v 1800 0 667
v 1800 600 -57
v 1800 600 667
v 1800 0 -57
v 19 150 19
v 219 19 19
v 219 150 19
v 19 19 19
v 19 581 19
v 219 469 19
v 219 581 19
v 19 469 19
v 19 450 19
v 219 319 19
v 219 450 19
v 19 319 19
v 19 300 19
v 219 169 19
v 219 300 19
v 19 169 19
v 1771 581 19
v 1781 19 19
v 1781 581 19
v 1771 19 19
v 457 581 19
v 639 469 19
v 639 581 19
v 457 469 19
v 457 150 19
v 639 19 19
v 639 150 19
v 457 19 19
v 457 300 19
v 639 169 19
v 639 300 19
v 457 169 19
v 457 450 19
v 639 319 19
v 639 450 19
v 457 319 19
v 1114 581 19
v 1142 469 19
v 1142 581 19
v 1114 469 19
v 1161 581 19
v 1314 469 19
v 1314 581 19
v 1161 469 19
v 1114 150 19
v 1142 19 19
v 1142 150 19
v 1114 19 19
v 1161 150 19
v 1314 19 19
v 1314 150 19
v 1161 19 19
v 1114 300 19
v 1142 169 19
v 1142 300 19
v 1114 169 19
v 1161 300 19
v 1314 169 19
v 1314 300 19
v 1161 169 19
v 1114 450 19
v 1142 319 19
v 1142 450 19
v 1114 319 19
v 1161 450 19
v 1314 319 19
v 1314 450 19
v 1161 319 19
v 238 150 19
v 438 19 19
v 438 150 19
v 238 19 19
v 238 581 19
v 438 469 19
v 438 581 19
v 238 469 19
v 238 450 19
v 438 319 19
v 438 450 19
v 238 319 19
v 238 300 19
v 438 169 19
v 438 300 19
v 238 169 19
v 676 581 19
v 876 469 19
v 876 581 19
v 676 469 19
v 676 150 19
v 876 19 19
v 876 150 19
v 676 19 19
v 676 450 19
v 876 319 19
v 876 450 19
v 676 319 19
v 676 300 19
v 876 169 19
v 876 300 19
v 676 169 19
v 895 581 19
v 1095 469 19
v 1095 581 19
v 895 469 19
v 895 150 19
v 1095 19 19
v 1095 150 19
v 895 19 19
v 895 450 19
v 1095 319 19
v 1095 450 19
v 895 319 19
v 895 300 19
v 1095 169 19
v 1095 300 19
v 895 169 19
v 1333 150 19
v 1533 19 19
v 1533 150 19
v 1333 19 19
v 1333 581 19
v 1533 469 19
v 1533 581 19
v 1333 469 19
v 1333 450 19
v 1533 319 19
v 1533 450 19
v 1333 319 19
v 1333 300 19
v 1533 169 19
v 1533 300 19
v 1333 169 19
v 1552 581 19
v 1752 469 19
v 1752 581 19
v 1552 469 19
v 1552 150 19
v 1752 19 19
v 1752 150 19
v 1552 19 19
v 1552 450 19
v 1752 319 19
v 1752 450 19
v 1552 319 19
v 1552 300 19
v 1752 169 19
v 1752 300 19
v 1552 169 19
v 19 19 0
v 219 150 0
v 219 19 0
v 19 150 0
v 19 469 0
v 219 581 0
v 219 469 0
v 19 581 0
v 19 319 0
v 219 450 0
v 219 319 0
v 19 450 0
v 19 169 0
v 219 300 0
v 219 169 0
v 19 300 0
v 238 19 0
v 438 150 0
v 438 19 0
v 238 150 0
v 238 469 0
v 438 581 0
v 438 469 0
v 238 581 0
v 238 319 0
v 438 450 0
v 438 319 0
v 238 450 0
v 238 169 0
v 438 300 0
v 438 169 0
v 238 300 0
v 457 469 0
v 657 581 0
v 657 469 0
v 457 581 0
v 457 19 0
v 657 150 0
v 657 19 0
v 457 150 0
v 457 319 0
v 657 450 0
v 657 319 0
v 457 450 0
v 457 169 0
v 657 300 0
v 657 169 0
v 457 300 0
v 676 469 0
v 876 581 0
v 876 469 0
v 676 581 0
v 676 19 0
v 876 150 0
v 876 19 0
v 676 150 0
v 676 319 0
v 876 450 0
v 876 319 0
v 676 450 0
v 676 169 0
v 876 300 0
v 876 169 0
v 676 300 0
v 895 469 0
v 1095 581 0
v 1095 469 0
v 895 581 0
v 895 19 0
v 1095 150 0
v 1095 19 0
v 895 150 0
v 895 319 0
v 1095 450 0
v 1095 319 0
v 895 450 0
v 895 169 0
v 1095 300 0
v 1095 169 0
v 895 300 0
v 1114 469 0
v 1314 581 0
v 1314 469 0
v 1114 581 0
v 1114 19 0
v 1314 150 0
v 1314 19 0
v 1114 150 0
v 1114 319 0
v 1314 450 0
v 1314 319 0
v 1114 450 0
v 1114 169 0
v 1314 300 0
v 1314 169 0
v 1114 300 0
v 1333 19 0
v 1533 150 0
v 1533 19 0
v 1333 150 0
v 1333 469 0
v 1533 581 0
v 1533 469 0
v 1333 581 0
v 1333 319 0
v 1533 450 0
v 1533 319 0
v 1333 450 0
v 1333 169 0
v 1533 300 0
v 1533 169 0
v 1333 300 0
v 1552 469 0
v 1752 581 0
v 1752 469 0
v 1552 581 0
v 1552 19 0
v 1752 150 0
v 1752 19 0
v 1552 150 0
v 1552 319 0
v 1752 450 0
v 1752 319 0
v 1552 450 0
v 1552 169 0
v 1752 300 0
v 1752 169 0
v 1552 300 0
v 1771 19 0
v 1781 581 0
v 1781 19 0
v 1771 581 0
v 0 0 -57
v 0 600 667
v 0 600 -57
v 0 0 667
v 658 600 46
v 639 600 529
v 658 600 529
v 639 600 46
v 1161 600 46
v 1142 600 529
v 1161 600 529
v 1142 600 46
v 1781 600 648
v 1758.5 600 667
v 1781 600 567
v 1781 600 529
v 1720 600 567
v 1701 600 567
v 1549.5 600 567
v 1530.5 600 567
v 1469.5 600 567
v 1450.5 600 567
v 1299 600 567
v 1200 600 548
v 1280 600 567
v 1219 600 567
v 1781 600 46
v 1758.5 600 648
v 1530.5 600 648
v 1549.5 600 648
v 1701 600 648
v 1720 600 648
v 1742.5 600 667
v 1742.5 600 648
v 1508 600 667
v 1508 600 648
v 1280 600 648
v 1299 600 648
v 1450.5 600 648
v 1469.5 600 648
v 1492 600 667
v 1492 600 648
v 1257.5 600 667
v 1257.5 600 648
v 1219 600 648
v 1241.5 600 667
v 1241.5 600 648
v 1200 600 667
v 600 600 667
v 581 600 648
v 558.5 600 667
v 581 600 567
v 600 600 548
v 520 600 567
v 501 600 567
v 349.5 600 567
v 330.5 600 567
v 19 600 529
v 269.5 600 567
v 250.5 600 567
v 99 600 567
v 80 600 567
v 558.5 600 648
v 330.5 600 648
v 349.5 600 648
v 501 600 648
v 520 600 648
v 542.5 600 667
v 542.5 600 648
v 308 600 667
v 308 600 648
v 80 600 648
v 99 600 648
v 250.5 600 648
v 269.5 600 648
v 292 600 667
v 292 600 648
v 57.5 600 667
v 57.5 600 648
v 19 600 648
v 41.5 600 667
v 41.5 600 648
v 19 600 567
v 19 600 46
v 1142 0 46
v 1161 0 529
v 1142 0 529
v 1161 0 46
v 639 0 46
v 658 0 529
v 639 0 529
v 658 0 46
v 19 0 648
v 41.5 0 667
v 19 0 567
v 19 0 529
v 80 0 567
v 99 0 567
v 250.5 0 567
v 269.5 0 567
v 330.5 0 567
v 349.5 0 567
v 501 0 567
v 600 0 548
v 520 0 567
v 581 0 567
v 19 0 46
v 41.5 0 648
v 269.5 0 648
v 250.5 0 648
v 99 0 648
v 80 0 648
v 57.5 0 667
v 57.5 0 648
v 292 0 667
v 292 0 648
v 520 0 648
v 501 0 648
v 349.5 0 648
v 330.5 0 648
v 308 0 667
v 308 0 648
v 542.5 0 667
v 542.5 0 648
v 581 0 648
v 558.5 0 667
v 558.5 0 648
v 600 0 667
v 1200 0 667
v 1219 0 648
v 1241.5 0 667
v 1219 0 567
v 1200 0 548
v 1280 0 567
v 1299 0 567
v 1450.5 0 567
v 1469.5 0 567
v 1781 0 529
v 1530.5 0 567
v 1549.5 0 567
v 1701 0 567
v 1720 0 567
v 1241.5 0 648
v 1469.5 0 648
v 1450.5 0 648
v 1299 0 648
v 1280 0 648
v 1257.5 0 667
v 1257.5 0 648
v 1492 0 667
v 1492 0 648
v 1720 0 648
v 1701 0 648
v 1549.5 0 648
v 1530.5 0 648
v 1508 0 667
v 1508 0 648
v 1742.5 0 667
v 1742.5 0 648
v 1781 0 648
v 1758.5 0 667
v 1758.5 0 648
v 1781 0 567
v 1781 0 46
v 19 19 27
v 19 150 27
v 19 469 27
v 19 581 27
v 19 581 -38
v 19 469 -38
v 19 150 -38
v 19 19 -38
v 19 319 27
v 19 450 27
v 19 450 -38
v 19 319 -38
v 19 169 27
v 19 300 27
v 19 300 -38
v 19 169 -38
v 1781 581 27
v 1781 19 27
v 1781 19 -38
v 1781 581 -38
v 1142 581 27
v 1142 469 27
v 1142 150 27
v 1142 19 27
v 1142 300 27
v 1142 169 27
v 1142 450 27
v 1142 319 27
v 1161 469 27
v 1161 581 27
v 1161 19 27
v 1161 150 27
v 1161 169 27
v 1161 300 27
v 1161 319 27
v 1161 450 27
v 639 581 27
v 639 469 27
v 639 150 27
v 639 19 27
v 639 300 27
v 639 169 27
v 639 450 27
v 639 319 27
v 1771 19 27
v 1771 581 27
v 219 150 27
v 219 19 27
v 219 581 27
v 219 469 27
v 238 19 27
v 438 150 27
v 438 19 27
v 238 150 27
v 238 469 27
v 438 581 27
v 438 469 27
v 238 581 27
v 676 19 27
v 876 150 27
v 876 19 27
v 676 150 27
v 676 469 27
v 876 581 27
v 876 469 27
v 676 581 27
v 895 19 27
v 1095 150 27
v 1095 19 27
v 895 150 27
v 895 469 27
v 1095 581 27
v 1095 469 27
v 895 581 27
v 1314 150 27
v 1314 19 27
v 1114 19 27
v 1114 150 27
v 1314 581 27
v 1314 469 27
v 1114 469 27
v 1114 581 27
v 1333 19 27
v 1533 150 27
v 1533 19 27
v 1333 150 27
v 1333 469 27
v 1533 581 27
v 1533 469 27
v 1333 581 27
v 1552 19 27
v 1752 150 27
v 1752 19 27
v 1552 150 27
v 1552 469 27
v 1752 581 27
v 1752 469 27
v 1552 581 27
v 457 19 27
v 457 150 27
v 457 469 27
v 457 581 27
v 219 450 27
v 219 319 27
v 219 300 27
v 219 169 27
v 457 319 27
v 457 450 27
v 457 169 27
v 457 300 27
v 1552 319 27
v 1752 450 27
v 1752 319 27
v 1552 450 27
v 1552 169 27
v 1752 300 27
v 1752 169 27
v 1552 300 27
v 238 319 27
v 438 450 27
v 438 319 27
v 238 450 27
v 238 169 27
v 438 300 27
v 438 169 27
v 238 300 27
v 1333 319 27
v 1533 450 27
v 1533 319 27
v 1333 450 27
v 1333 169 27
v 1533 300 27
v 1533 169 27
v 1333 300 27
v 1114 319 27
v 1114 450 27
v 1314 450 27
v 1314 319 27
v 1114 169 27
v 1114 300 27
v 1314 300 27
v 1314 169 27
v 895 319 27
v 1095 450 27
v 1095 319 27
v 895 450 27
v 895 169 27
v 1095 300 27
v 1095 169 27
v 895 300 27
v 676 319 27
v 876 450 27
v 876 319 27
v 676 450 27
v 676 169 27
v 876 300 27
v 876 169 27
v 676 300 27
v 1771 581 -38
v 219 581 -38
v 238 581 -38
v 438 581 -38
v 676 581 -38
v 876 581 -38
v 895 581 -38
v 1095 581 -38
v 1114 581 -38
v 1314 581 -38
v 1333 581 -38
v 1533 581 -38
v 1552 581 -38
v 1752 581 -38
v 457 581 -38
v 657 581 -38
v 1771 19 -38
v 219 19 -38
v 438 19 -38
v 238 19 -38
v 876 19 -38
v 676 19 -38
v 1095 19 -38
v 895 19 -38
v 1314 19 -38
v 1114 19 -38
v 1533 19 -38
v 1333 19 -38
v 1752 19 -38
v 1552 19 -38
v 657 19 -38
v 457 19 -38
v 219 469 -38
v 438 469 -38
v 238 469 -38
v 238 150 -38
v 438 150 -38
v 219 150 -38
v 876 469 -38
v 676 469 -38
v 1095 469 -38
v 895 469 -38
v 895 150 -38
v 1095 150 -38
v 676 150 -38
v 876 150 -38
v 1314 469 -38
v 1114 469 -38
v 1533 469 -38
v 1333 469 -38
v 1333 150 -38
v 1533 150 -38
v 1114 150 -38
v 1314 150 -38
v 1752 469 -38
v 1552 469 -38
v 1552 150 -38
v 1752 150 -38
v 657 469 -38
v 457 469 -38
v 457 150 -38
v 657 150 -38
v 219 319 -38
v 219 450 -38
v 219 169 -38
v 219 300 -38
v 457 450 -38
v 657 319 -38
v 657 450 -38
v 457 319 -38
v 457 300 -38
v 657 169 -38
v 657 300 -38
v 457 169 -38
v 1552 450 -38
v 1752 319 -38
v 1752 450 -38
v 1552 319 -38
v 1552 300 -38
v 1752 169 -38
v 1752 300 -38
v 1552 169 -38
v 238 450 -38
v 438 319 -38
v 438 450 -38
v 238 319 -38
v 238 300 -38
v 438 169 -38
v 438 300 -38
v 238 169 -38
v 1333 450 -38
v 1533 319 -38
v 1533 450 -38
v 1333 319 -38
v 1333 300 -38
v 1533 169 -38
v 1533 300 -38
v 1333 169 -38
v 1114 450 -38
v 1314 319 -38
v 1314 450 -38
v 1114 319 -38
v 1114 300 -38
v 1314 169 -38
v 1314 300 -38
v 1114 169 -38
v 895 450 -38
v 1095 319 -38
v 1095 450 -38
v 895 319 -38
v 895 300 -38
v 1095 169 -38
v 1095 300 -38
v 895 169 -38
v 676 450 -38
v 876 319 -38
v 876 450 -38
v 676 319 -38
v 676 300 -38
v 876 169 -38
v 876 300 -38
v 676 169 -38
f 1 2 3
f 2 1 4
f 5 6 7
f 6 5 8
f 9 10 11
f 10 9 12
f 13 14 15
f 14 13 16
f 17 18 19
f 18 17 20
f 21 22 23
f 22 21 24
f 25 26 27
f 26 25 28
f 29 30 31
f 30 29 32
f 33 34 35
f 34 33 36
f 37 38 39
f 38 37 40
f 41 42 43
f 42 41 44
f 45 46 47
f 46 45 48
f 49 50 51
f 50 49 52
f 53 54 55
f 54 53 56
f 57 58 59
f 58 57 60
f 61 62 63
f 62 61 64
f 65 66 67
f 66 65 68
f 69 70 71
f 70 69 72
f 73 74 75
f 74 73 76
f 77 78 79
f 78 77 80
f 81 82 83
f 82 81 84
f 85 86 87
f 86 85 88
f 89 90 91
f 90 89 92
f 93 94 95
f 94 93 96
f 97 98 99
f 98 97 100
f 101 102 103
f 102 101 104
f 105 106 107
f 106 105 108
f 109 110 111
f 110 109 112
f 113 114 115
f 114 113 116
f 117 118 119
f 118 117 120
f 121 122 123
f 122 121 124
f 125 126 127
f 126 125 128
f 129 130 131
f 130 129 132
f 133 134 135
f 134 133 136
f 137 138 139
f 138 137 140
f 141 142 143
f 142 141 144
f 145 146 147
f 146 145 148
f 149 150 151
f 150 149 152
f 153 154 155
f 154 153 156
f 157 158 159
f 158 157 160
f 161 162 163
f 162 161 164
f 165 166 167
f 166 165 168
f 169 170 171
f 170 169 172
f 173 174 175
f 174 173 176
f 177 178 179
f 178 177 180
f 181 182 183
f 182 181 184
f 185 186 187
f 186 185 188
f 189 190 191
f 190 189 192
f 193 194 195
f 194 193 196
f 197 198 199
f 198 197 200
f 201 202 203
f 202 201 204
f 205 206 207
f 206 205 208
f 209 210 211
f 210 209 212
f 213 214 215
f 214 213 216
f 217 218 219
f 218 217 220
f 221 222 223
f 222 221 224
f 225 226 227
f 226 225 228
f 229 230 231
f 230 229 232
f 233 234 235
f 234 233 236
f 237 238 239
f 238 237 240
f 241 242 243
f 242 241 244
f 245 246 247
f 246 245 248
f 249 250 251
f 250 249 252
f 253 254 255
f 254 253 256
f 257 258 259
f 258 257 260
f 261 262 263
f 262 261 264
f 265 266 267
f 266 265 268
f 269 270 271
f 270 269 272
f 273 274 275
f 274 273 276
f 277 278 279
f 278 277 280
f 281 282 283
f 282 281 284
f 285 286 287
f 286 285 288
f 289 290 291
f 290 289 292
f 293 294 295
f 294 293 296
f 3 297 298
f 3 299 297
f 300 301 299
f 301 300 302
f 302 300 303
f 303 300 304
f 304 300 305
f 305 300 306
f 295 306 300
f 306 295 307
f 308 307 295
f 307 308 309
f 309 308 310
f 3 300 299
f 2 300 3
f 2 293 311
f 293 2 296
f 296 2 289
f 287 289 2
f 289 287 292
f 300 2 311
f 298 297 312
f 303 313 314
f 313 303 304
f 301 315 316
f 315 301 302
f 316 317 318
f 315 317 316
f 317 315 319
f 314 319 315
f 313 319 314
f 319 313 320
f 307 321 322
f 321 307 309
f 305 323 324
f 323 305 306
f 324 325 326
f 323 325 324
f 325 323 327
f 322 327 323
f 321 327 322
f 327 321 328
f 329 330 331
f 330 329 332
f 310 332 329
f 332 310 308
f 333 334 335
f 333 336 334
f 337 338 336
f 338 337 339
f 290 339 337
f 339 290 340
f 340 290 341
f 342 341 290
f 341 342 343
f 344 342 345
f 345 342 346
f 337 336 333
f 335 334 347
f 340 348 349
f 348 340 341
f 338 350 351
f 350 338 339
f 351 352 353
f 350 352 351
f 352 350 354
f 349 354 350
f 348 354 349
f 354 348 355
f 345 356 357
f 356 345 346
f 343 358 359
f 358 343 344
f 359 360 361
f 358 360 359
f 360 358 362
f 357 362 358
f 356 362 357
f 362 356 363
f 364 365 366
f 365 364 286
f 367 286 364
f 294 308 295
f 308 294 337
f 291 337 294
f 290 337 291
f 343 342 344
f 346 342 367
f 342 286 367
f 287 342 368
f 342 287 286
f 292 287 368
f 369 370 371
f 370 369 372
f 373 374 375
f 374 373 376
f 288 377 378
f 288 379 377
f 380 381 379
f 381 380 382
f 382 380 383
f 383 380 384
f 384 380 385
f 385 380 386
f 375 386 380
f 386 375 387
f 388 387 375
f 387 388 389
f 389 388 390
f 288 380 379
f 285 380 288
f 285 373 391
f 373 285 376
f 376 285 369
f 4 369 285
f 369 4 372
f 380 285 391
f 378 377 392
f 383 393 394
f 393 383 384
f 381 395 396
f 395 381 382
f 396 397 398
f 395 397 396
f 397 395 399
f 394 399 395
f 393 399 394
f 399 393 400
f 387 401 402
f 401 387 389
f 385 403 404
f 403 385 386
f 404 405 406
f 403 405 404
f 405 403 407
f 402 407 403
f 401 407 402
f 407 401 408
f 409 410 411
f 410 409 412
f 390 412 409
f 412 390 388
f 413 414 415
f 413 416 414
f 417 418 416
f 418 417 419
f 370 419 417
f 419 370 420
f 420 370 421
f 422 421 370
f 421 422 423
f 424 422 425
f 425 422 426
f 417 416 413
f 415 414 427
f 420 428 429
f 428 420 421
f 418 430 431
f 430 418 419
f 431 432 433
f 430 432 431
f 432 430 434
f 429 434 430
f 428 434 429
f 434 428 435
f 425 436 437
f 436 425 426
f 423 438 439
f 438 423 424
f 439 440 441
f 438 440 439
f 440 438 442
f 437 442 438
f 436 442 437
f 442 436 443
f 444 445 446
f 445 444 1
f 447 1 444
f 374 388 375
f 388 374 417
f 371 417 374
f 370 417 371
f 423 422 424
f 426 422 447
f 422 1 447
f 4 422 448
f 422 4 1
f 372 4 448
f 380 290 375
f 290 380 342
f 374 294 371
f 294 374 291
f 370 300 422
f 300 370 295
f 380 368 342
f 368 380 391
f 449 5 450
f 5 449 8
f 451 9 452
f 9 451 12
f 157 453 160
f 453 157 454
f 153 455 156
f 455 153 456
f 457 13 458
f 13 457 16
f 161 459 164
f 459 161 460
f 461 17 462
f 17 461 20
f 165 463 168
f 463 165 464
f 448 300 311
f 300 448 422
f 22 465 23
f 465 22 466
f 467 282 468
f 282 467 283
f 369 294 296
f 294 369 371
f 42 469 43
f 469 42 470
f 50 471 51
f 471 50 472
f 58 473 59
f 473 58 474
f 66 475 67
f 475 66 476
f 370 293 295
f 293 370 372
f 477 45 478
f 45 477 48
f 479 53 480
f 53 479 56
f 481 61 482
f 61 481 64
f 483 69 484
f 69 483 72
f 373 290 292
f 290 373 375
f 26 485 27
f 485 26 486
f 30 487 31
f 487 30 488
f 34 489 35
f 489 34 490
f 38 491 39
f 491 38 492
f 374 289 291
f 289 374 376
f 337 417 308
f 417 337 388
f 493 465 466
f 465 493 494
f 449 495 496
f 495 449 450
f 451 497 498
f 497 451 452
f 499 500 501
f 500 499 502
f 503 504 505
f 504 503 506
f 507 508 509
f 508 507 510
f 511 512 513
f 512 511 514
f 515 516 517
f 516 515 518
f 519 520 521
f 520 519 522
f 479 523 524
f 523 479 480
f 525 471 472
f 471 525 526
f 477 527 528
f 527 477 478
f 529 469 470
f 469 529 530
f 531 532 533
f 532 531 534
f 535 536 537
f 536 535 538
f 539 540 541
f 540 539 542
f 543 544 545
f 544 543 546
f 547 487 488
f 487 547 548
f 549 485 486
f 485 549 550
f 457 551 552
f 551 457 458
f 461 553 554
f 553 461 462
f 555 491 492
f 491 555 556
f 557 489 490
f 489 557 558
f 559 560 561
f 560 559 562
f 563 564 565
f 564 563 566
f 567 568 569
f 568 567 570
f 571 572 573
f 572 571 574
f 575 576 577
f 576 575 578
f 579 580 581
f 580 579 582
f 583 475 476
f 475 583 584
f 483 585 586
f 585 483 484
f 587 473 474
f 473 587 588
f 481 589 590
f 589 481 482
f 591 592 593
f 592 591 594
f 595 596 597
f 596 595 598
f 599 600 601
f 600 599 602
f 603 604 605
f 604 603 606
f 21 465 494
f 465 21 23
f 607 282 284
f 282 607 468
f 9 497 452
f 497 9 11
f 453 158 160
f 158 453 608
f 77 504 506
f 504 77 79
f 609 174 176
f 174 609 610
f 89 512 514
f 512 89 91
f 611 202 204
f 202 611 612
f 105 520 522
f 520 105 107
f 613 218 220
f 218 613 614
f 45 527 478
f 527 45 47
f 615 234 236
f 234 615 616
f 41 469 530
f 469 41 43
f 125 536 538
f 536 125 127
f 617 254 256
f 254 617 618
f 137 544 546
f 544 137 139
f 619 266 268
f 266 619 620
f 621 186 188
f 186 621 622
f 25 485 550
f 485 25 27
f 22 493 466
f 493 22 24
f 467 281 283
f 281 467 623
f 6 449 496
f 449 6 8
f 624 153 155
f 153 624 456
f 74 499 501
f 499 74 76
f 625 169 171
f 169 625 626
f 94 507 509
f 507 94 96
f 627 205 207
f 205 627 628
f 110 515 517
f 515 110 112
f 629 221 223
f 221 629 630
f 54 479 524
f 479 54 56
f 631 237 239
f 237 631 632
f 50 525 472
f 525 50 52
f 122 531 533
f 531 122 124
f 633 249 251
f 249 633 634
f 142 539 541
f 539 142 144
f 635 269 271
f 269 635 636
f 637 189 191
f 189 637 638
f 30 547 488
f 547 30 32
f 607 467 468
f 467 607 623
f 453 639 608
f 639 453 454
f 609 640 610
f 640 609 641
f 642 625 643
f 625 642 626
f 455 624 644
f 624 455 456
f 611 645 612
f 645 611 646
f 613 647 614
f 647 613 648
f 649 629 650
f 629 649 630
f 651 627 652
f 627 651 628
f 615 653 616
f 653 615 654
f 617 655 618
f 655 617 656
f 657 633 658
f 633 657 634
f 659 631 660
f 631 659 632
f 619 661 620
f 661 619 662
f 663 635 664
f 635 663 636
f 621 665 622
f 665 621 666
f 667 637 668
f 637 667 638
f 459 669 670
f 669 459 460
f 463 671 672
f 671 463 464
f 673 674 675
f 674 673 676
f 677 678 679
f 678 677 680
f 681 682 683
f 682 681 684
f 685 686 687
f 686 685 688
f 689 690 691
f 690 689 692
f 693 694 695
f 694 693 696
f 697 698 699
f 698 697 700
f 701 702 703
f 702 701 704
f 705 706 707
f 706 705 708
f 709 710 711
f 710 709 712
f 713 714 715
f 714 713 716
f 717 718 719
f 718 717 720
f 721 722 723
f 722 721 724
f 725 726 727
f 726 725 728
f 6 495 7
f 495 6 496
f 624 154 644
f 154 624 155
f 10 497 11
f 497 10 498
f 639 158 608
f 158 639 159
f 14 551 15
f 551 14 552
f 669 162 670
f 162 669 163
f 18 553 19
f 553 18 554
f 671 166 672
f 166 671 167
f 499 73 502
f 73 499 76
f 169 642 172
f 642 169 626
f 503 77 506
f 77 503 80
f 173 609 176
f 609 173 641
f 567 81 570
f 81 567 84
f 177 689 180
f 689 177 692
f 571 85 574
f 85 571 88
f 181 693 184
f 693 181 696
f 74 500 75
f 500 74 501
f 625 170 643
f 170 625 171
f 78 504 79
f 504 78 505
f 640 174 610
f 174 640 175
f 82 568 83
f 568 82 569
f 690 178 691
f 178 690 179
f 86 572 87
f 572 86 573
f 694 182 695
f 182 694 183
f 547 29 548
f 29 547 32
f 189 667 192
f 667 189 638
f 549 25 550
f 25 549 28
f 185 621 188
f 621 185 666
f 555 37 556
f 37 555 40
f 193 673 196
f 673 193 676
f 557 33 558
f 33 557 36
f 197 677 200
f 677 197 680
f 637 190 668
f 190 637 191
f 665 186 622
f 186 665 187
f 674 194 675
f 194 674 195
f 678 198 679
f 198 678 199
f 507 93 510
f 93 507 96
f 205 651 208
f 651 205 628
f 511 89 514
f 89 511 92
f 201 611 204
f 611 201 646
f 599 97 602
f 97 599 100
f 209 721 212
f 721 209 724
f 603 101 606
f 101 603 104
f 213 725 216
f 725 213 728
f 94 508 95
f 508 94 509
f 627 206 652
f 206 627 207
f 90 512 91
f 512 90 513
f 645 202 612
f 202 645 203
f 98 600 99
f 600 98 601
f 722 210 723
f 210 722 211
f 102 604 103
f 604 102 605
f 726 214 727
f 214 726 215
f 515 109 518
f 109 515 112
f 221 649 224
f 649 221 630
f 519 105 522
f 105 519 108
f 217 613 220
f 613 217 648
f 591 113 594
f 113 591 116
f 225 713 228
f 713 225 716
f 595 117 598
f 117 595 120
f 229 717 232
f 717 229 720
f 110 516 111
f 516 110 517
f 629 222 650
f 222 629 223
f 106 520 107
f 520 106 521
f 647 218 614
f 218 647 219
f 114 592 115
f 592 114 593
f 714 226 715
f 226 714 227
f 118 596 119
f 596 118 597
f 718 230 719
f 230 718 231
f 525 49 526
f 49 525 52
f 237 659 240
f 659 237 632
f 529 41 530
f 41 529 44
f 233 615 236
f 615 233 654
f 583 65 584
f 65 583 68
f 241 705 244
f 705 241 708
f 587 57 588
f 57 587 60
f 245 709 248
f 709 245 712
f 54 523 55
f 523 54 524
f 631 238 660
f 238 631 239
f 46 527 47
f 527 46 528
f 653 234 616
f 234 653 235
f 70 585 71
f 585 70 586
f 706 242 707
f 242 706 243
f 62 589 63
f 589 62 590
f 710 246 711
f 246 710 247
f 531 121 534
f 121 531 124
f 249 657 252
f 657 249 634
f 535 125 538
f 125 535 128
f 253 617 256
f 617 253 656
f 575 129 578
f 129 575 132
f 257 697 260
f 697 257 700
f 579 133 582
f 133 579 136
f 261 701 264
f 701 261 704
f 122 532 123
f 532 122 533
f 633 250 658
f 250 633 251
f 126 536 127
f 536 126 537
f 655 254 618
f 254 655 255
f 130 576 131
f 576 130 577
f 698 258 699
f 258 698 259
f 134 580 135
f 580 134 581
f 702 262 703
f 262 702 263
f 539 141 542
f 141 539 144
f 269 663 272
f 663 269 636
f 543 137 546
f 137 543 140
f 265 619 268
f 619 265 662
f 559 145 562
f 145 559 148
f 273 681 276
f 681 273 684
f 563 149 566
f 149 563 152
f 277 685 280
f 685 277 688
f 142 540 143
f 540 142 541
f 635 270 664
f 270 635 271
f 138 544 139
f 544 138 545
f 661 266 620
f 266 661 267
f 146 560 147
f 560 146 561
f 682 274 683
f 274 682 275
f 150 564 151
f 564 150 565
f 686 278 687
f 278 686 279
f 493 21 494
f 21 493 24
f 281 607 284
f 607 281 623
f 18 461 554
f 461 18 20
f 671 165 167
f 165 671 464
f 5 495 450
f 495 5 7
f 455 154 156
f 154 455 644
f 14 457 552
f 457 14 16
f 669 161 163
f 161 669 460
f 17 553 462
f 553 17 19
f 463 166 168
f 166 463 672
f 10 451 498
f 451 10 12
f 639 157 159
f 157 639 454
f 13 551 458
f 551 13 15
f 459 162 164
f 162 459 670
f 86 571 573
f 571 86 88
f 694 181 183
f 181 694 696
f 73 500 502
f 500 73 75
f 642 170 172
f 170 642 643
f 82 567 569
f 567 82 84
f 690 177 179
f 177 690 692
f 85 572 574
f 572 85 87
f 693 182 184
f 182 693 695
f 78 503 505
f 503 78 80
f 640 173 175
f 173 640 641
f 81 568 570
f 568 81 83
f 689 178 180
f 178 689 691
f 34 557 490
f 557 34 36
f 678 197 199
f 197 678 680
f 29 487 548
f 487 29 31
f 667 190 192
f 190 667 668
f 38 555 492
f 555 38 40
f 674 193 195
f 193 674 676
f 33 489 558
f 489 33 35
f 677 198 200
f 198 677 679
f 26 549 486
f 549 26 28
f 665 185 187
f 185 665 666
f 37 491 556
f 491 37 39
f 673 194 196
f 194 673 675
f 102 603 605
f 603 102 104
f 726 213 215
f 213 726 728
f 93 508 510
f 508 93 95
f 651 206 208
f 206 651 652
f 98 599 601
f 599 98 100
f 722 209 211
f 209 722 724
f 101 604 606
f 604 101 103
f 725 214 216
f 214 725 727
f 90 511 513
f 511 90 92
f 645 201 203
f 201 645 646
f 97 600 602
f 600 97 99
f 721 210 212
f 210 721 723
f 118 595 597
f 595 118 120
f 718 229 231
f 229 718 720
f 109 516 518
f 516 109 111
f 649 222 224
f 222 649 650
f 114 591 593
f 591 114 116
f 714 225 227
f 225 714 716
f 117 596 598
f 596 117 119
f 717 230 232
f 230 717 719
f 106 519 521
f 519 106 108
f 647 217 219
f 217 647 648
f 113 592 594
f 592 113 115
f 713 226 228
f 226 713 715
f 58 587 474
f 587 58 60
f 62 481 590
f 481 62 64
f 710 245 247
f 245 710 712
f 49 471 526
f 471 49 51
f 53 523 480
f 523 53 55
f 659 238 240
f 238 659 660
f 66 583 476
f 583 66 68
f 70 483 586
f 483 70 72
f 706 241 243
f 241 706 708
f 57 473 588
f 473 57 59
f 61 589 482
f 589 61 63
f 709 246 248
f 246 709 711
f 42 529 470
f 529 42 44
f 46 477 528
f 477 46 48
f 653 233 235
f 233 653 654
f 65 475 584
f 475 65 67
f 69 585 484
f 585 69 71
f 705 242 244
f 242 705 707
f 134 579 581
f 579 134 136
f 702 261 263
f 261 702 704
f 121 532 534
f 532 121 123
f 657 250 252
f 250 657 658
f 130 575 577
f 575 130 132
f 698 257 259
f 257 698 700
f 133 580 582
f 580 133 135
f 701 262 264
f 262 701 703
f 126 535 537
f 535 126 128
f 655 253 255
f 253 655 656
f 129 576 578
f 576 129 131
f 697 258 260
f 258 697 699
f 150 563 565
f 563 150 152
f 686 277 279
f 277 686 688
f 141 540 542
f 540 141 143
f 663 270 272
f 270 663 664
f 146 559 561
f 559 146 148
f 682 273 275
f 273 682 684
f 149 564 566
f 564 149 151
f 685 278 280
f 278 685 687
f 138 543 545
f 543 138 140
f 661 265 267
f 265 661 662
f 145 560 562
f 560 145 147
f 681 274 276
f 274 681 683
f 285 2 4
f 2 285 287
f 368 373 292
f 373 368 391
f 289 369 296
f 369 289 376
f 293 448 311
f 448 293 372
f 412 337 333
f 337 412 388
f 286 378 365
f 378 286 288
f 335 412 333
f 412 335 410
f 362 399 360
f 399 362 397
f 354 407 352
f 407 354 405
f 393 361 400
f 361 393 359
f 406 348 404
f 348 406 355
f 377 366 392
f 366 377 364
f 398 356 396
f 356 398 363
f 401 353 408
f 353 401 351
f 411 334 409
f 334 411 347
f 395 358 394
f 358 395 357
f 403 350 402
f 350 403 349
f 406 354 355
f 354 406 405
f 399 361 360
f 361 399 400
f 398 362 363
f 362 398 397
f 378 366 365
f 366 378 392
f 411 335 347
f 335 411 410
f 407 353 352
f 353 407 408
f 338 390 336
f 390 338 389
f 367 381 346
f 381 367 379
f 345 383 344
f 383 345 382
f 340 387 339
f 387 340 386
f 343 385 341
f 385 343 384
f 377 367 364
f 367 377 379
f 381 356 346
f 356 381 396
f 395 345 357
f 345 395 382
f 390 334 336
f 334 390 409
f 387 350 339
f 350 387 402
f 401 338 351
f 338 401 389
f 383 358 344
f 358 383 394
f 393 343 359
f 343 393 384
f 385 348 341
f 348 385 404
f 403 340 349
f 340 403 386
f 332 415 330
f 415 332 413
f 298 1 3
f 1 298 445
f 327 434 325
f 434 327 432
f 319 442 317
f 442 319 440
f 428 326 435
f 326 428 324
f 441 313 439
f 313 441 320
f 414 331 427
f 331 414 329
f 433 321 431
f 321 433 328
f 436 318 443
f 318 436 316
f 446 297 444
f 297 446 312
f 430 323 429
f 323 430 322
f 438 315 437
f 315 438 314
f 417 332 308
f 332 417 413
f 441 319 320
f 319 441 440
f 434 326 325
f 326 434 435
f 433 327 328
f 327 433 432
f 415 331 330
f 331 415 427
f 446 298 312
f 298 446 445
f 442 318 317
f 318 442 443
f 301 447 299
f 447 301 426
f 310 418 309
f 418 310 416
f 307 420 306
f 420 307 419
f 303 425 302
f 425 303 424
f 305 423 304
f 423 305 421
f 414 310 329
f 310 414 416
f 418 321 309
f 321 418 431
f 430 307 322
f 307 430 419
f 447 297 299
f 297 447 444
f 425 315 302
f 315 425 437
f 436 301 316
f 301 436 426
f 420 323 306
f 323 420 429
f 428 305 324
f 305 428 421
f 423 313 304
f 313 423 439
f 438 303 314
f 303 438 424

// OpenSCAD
dim_major_width = 1800;
dim_major_depth = 600;
dim_carcas_height = 510;

dim_sheet_thickness = 19;

dim_torsion_height = 65;

dim_mitre_height = 100 - dim_sheet_thickness;

//////////////////////////////////////////////////////////////////////////////////////

module sheet(w, h, part){
	cube([w, h, dim_sheet_thickness]);
	echo("BOM:",part,w,h,dim_sheet_thickness);
}

module sheetv(w, h, part){
	translate([0,0,dim_sheet_thickness])cube([w, dim_sheet_thickness, h]);
	echo("BOM:",part,w,h,dim_sheet_thickness);
}

//////////////////////////////////////////////////////////////////////////////////////

carcas();
translate([ 0, 0, -1 * ( 2 * dim_sheet_thickness + dim_sheet_thickness)])torsion();

translate([ 0, 0, dim_carcas_height + dim_sheet_thickness * 2])box();
translate([ dim_major_width - dim_major_depth, 0, dim_carcas_height + dim_sheet_thickness * 2])box();

module box(){
	offset = 80;
	sheet(dim_major_depth, dim_major_depth, "Box base");

	translate([ dim_sheet_thickness, 0, 0])rotate([ 0, 0, 90])sheetv(dim_major_depth, dim_mitre_height, "Box end");
	translate([ dim_sheet_thickness + offset, 0, 0])rotate([ 0, 0, 90])sheetv(dim_major_depth, dim_mitre_height, "Box end");

	translate([ dim_major_depth , 0, 0])rotate([ 0, 0, 90])sheetv(dim_major_depth, dim_mitre_height, "Box end");
	translate([ dim_major_depth - offset, 0, 0])rotate([ 0, 0, 90])sheetv(dim_major_depth, dim_mitre_height, "Box end");

	translate([ (dim_major_depth - offset) / 2 + dim_sheet_thickness/2 , 0, 0])rotate([ 0, 0, 90])sheetv(dim_major_depth, dim_mitre_height, "Box end");
	translate([ (dim_major_depth - offset) / 2 + offset + dim_sheet_thickness/2, 0, 0])rotate([ 0, 0, 90])sheetv(dim_major_depth, dim_mitre_height, "Box end");

	difference(){
		translate([ 0, 0, dim_mitre_height + dim_sheet_thickness])sheet(dim_major_depth, dim_major_depth, "Box base");

		translate([ dim_major_depth / 2, 0, 0])cube([16, 2000, 400], center=true);
		translate([ offset / 2 + dim_sheet_thickness/2, 0, 0])cube([16, 2000, 400], center=true);
		translate([ dim_major_depth - offset / 2 - dim_sheet_thickness/2, 0, 0])cube([16, 2000, 400], center=true);
	}

}

module carcas(){
	dim_mitre_saw = 620;
	dim_drill = 620;

	sheet(dim_major_width, dim_major_depth, "Carcas base");
	translate([ dim_sheet_thickness, 0, 0])rotate([ 0, 0, 90])sheetv(dim_major_depth, dim_carcas_height, "Carcas end");
	translate([ dim_major_width, 0, 0])rotate([ 0, 0, 90])sheetv(dim_major_depth, dim_carcas_height, "Carcas end");
	translate([ dim_major_width - dim_mitre_saw - dim_sheet_thickness, 0, 0])rotate([ 0, 0, 90])sheetv(dim_major_depth, dim_carcas_height, "Carcas end");
	translate([ dim_drill + dim_sheet_thickness * 2, 0, 0])rotate([ 0, 0, 90])sheetv(dim_major_depth, dim_carcas_height, "Carcas end");
	translate([ 0, 0, dim_carcas_height + dim_sheet_thickness]) sheet(dim_major_width, dim_major_depth, "Carcas top");

}


module torsion(){
	

	sheet(dim_major_width, dim_major_depth, "Torsion base");
	sheetv(dim_major_width, dim_torsion_height, "Torsion long wall");
	translate([0, dim_major_depth - dim_sheet_thickness, 0])sheetv(dim_major_width, dim_torsion_height, "Torsion long wall");

	for( joist = [0 : 200 + dim_sheet_thickness : (dim_major_width - dim_sheet_thickness)]){
		translate([ dim_sheet_thickness + joist, dim_sheet_thickness, 0])rotate([ 0, 0, 90])sheetv( dim_major_depth - 2 * dim_sheet_thickness, dim_torsion_height, ,"Torsion joist");
	}
	translate([ dim_major_width, dim_sheet_thickness, 0])rotate([ 0, 0, 90])sheetv( dim_major_depth - 2 * dim_sheet_thickness, dim_torsion_height, ,"Torsion joist");

	translate([ 0, 0, dim_torsion_height + dim_sheet_thickness])sheet(dim_major_width, dim_major_depth, "Torsion base");

	for( joist = [0 : 200 + dim_sheet_thickness : (dim_major_width - dim_sheet_thickness) - 100]){
		for (rib = [dim_major_depth / 4 : dim_major_depth / 4 : dim_major_depth - 1]){
			translate([ joist + dim_sheet_thickness, rib, 0])sheetv(200, dim_torsion_height, "Torsion rib");
		}
	}

}
